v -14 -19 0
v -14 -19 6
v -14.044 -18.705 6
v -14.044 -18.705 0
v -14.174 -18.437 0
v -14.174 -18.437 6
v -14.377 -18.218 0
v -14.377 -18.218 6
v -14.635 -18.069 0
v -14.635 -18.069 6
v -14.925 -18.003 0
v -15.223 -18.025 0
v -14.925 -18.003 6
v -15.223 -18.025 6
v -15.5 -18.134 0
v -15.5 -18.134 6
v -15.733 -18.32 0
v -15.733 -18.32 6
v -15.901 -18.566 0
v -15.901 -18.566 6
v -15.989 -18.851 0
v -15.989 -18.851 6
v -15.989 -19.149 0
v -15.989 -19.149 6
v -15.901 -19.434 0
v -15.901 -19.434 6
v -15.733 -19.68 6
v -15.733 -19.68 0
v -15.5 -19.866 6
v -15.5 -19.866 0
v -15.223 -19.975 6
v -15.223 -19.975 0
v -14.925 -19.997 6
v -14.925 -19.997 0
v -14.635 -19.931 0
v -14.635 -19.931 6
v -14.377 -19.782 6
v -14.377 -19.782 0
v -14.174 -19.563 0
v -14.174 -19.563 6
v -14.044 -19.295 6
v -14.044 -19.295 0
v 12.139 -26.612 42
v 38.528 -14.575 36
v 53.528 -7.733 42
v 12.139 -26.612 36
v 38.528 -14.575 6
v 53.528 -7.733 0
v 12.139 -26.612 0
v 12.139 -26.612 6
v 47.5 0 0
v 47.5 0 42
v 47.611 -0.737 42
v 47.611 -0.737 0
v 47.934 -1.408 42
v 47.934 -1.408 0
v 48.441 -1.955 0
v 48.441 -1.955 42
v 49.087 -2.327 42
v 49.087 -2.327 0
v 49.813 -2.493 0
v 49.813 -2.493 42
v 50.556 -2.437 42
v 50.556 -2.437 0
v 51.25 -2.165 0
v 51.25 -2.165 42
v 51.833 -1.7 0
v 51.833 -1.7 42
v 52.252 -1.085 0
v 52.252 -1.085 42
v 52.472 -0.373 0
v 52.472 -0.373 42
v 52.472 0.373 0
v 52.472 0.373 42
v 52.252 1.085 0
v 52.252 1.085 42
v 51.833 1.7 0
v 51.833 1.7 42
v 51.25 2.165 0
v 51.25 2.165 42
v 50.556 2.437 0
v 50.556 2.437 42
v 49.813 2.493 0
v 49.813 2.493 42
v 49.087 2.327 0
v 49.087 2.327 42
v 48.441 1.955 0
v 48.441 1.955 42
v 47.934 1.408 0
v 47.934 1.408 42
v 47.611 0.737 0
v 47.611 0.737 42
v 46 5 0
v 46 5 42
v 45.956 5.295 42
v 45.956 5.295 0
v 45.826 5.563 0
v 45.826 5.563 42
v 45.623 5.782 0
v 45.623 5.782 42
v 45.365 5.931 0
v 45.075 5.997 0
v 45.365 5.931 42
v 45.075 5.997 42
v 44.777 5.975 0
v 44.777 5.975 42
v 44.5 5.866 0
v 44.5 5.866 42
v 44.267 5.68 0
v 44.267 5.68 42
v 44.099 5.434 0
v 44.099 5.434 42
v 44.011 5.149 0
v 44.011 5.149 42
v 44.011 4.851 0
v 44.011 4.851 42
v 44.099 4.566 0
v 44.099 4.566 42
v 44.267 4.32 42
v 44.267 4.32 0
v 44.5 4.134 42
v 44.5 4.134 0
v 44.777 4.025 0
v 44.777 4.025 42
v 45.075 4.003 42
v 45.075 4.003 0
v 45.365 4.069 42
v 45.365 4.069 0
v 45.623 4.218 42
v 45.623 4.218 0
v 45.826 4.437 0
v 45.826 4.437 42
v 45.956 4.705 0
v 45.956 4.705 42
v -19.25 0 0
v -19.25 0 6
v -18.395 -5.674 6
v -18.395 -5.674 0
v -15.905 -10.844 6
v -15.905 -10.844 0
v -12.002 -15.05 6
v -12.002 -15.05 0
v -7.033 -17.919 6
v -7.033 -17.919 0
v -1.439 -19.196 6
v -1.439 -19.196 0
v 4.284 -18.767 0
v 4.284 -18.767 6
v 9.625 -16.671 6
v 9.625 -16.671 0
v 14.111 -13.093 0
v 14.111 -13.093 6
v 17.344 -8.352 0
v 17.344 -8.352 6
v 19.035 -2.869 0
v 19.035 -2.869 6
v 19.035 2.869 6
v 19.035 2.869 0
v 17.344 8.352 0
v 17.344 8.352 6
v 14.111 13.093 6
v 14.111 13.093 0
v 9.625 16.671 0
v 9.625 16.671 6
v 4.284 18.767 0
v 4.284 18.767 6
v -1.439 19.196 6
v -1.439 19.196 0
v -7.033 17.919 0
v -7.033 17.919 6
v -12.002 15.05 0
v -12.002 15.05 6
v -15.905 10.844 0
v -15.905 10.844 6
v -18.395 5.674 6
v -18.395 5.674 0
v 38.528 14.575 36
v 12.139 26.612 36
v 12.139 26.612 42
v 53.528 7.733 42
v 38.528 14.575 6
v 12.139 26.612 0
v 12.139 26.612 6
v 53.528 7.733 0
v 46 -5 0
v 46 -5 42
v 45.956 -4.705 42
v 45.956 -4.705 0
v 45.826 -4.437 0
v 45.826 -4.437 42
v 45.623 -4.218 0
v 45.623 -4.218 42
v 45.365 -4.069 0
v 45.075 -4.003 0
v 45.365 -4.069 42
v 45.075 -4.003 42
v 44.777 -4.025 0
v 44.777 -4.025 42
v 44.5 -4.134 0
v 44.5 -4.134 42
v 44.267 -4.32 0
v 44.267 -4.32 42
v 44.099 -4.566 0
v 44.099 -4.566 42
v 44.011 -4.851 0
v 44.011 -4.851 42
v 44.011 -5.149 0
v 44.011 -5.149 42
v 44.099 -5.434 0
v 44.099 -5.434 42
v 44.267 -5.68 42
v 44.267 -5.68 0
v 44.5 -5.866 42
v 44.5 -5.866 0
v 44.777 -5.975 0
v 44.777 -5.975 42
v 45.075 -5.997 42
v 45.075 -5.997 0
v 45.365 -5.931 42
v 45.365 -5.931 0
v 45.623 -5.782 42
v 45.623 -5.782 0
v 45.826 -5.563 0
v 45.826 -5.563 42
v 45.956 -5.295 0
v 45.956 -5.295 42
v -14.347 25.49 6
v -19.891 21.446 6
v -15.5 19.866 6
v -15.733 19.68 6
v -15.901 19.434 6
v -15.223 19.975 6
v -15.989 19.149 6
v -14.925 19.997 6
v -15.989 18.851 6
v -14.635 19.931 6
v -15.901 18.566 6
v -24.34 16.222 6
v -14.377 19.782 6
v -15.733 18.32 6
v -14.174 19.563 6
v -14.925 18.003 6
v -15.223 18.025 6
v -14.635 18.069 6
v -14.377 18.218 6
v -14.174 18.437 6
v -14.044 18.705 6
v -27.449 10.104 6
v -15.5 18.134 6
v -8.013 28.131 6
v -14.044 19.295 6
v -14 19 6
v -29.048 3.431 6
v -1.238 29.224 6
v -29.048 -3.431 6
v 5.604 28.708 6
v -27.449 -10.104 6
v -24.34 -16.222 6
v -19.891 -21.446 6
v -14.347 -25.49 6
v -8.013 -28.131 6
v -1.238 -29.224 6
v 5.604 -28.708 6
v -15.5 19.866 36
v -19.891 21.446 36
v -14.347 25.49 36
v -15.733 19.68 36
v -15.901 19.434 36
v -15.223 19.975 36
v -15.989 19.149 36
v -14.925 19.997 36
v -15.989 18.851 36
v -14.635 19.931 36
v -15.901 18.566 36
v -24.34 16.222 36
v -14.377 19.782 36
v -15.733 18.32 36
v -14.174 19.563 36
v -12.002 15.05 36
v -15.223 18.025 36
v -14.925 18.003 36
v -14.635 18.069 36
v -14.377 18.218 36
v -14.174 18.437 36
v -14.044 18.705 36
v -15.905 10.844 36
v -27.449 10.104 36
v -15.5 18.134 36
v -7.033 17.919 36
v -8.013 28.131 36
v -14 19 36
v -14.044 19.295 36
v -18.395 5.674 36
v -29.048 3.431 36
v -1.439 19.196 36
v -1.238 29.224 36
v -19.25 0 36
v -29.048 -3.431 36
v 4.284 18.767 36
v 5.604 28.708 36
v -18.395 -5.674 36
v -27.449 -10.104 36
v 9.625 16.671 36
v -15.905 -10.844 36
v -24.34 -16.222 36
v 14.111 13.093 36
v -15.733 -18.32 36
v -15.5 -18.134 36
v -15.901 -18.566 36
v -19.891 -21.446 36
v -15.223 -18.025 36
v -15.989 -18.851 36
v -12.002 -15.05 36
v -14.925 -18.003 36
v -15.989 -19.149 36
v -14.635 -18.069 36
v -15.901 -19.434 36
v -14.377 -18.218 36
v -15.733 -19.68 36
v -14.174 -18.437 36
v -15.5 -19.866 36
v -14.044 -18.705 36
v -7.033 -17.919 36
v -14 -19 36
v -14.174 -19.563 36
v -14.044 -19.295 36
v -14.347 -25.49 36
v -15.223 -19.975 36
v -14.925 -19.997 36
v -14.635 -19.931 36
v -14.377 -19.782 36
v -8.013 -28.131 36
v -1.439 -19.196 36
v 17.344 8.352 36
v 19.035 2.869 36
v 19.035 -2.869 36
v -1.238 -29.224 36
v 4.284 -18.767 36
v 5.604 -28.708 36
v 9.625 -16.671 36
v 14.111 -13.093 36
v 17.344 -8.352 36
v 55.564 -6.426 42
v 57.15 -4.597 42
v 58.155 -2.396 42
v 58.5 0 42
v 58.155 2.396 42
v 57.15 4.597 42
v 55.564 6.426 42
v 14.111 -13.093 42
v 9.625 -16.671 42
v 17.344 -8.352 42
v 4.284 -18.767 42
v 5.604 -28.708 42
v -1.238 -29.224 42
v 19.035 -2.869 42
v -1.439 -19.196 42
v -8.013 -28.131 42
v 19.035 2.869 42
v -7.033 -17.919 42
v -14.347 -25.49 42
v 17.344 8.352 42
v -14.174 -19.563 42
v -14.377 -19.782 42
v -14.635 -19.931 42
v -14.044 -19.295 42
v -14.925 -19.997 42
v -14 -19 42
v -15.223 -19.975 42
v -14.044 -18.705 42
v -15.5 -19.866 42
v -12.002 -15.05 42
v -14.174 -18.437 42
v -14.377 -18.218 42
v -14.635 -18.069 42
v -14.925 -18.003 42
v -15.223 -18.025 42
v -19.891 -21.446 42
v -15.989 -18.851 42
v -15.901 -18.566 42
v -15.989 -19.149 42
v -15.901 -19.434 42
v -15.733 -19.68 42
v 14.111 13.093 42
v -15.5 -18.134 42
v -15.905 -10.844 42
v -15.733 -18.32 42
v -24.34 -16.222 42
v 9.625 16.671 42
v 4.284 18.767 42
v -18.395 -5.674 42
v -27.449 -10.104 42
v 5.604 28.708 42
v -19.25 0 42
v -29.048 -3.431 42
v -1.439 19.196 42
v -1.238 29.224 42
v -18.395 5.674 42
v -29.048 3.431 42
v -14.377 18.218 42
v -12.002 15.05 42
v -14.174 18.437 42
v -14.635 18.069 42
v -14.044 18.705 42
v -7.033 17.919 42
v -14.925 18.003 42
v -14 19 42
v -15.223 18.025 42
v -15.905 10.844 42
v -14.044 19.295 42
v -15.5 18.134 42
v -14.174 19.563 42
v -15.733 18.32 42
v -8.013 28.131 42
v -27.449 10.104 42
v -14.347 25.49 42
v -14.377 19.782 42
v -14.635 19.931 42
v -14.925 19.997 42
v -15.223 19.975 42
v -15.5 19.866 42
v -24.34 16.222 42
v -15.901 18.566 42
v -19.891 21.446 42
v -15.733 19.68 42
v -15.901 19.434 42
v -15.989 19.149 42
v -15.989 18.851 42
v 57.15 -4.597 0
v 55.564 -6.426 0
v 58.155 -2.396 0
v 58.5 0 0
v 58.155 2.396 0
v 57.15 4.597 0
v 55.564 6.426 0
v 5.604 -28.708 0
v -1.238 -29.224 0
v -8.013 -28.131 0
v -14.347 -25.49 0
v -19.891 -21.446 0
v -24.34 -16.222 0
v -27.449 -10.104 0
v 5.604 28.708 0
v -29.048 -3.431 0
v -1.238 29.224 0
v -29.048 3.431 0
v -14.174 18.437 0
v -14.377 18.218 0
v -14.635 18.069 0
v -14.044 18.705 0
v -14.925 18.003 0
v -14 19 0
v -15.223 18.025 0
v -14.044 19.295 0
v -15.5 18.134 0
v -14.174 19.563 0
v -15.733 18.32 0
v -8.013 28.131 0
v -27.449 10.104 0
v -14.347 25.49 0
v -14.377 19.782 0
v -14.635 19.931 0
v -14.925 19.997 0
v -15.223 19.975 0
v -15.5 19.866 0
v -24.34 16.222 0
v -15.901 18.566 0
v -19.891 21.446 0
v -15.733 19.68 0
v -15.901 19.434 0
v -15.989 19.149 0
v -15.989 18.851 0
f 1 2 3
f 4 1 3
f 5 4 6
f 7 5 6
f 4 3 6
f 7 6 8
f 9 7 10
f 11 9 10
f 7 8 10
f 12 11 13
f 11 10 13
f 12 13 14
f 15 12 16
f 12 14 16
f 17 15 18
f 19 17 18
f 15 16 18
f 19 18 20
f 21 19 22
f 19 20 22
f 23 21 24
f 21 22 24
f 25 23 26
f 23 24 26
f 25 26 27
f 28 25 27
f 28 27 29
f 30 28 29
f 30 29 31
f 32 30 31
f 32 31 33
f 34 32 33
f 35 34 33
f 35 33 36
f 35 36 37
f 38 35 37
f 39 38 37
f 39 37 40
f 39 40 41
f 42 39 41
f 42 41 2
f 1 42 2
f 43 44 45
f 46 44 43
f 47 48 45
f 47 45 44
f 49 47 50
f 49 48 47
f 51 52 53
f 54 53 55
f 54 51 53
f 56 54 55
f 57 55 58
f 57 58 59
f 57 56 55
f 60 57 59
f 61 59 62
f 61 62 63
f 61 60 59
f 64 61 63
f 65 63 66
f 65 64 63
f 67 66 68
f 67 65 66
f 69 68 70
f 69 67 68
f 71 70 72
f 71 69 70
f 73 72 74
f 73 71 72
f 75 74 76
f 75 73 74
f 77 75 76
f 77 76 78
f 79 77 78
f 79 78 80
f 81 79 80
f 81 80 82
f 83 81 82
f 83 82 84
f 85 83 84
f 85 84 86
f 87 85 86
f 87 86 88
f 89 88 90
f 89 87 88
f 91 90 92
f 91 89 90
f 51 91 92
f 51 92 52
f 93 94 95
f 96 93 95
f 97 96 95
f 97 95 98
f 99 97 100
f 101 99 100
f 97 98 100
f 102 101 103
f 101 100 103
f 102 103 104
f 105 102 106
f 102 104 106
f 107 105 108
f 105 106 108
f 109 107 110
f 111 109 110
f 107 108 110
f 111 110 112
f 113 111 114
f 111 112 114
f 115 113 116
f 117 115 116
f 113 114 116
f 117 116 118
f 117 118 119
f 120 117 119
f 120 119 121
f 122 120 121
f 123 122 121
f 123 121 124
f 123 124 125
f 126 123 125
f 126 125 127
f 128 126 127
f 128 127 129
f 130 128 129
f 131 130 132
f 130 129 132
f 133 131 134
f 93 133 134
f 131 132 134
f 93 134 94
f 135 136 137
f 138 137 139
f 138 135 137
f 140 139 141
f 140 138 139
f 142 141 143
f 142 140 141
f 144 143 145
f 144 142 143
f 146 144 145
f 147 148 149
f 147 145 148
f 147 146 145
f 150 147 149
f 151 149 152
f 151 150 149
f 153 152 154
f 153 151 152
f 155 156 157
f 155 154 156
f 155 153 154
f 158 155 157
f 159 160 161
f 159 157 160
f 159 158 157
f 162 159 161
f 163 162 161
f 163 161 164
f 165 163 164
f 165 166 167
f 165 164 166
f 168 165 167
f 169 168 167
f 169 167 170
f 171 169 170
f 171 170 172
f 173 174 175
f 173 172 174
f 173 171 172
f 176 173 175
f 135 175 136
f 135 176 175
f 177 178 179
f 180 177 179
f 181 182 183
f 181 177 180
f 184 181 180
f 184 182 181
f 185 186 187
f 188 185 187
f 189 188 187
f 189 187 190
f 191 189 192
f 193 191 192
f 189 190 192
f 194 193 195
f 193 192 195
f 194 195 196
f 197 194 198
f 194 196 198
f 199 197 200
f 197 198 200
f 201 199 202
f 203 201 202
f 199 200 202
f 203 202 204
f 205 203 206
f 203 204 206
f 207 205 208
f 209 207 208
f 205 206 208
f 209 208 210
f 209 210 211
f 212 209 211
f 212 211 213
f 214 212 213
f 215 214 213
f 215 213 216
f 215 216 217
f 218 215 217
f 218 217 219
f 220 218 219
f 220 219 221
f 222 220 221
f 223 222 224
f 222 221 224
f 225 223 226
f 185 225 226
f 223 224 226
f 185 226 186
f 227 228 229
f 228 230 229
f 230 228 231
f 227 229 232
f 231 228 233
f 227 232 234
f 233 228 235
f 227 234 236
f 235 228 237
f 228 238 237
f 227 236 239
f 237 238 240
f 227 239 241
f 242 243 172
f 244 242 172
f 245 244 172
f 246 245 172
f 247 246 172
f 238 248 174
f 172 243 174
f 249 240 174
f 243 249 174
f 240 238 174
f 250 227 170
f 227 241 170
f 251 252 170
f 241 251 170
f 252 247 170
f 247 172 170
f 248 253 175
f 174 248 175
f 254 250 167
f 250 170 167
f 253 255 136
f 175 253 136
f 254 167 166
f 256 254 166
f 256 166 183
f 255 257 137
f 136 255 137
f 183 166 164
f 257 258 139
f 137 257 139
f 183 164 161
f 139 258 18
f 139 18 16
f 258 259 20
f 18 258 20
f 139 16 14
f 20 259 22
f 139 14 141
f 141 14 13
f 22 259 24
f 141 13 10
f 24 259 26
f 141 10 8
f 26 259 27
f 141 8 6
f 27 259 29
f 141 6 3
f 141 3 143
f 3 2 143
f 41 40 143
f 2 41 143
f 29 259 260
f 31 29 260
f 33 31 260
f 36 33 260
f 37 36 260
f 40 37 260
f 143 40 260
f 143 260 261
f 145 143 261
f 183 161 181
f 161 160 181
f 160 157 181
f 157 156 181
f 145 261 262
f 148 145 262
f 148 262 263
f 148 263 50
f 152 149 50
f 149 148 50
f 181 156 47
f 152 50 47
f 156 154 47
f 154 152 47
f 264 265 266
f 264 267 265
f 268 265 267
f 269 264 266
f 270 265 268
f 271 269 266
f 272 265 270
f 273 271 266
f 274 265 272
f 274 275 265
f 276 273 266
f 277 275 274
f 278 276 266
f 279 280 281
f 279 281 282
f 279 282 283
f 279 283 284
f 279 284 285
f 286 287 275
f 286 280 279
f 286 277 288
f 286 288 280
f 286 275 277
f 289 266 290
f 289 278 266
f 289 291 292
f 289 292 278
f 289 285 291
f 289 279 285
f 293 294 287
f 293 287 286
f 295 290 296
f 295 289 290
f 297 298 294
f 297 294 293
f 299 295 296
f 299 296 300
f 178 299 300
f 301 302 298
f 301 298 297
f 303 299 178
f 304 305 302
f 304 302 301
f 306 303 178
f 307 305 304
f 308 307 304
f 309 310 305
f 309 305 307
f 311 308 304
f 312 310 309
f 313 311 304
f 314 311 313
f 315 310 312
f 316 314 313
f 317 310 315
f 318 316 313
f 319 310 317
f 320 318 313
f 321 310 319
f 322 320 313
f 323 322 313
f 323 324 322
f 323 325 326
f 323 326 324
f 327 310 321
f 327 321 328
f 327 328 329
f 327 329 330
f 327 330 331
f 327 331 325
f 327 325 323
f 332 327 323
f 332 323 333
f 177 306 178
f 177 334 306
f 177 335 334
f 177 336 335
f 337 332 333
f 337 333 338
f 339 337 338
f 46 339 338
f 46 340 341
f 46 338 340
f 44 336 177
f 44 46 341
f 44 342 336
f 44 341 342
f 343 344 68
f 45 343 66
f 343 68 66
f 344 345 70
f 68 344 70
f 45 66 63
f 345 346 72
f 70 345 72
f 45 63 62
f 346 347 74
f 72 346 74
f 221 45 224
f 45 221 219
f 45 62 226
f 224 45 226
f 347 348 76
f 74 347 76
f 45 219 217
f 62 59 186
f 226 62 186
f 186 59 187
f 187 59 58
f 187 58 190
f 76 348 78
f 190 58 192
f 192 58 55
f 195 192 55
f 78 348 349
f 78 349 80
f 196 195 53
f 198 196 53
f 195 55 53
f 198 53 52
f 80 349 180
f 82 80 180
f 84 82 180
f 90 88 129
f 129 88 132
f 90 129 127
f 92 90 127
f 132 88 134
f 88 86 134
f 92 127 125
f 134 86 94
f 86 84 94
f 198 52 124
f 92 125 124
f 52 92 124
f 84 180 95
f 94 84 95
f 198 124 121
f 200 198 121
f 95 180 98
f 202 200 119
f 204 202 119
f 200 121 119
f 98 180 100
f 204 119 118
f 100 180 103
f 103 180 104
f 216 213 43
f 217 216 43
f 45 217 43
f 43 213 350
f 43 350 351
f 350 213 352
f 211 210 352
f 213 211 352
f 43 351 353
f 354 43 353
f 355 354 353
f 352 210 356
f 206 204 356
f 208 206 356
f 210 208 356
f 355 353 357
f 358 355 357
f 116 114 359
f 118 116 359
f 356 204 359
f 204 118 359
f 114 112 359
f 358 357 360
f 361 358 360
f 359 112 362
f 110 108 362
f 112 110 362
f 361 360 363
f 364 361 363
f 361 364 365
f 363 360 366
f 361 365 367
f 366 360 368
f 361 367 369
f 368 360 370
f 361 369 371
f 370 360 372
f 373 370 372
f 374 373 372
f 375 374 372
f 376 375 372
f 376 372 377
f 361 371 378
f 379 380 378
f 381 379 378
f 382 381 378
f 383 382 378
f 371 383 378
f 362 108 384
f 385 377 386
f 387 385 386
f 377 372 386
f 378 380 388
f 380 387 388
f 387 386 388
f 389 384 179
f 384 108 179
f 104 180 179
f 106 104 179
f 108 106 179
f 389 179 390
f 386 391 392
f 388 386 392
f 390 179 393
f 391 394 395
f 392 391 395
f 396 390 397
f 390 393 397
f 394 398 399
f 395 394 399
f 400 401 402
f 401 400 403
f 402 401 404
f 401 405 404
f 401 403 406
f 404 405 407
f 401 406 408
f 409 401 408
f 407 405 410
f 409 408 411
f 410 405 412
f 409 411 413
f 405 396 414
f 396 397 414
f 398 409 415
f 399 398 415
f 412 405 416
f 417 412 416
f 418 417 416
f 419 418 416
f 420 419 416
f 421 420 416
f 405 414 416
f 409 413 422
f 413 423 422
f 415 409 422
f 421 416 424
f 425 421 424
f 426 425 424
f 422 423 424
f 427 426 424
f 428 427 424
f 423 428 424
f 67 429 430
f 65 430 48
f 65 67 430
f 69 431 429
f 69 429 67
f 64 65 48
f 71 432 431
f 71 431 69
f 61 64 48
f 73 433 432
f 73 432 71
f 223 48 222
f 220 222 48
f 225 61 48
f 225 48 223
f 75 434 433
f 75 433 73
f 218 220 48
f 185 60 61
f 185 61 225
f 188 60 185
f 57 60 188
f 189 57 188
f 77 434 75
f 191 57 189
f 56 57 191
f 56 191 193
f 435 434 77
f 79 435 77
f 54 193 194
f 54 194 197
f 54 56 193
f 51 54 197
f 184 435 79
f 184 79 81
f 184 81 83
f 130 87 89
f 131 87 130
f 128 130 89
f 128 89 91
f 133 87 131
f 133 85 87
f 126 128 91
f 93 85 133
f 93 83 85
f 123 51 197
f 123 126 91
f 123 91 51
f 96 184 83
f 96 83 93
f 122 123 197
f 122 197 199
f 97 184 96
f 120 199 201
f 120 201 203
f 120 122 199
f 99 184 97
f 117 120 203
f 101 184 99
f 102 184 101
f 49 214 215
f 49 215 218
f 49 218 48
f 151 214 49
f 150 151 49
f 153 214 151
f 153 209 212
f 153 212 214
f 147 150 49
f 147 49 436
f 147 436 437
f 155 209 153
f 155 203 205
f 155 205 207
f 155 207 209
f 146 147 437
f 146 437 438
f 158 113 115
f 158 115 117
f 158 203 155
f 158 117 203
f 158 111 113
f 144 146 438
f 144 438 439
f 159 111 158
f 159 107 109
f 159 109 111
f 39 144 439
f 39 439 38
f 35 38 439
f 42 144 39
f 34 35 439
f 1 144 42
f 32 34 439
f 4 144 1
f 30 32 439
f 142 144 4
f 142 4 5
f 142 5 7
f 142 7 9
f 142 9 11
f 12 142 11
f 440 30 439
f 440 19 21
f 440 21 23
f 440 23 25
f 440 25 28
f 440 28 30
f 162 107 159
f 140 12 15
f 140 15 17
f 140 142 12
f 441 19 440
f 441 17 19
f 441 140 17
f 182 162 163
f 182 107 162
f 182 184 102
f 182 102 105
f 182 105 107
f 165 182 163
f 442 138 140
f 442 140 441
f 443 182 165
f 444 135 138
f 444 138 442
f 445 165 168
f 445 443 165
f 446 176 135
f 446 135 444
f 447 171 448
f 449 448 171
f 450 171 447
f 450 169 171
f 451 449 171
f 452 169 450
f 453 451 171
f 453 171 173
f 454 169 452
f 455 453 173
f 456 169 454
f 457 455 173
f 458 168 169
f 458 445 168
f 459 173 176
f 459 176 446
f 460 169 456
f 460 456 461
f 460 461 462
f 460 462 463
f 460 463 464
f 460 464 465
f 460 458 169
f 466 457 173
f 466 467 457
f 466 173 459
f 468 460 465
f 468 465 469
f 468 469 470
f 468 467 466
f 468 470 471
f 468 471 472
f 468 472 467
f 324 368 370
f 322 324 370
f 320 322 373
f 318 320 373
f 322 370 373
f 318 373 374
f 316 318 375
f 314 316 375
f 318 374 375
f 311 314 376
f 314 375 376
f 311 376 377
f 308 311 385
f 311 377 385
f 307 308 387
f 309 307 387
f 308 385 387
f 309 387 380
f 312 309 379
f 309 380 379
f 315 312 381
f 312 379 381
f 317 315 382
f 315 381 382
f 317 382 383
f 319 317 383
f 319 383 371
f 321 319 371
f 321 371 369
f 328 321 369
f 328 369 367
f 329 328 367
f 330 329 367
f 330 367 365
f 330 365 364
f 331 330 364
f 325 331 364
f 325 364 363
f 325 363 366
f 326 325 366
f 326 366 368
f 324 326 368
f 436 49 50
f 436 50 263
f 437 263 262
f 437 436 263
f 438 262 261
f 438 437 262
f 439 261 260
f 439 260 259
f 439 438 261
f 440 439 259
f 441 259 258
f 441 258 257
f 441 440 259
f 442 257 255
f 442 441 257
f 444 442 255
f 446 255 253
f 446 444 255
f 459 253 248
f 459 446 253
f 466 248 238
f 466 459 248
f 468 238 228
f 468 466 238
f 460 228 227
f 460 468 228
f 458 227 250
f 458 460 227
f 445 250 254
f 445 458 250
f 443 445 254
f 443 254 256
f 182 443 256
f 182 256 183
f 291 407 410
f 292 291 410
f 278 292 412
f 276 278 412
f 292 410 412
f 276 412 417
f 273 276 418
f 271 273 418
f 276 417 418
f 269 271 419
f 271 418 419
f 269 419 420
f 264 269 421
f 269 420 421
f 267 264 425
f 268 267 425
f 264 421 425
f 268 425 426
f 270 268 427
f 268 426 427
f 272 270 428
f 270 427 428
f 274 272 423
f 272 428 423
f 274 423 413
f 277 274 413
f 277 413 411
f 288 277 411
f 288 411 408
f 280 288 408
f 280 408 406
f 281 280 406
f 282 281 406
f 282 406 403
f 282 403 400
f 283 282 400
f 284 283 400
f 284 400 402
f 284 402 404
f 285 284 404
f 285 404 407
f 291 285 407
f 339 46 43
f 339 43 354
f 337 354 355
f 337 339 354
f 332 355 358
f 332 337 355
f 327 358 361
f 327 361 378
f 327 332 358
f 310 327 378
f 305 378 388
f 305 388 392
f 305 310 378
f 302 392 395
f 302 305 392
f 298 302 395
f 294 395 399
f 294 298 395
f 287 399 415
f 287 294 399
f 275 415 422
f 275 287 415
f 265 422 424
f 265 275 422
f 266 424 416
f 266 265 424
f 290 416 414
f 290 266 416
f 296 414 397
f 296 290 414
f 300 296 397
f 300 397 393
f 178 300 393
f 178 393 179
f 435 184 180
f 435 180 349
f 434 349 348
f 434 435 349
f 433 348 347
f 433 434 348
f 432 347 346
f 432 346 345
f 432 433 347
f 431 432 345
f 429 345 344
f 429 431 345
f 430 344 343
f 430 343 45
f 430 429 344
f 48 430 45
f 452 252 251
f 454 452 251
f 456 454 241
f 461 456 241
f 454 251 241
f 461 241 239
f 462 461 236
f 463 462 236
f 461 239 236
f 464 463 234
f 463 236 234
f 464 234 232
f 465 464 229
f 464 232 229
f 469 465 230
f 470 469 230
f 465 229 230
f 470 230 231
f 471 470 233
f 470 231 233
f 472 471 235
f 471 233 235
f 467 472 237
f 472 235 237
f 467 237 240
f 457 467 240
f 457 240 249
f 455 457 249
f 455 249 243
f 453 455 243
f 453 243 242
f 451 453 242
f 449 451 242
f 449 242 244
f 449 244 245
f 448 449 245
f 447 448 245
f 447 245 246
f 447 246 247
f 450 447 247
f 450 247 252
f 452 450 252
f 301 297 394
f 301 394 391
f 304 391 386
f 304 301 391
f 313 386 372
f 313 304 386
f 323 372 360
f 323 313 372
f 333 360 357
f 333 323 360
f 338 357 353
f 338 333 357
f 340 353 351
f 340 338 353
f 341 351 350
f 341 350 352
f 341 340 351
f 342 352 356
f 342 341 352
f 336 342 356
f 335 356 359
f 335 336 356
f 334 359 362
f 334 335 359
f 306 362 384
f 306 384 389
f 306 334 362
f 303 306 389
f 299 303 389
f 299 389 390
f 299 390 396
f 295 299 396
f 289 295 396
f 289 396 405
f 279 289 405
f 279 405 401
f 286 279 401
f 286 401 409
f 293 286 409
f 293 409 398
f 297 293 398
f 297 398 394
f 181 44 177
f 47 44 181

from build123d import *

# Parameters (mm, degrees)
ESQUISSE1_R                  = 19.25
ESQUISSE1_R_2                = 2.5
BOSS_EXTRU_1_DEPTH           = 42
ENL_V_MAT_EXTRU_1_DEPTH      = 74.881298321
ENL_V_MAT_EXTRU_1_DEPTH_BACK = 74.881298321
ESQUISSE2_W                  = 90
ESQUISSE2_H                  = 30
ESQUISSE3_R                  = 1
ENL_V_MAT_EXTRU_2_DEPTH      = 42


with BuildPart() as part:
    # Esquisse1 → Boss.-Extru.1 (new body)
    with BuildSketch(Plane.XY):
        with BuildLine():
            Line((12.13875, 26.612276273), (53.5275, 7.733481994))
            ThreePointArc((53.5275, 7.733481994), (58.5, 0), (53.5275, -7.733481994))
            Line((53.5275, -7.733481994), (12.13875, -26.612276273))
            ThreePointArc((12.13875, -26.612276273), (-29.25, 0), (12.13875, 26.612276273))
        make_face()
        with Locations(Location((0, 0, 0), (0, 0, 180))):
            Circle(ESQUISSE1_R, mode=Mode.SUBTRACT)
        with Locations(Location((50, 0, 0), (0, 0, 180))):
            Circle(ESQUISSE1_R_2, mode=Mode.SUBTRACT)
    extrude(amount=BOSS_EXTRU_1_DEPTH)

    # Esquisse2 → Enlèv. mat.-Extru.1 (cut, two sides: drawn at the far end of the back side and taken through both)
    with BuildSketch(Plane(origin=(5.218823759, 0, 0), x_dir=(1, 0, 0), z_dir=(0, 1, 0)).offset(-ENL_V_MAT_EXTRU_1_DEPTH_BACK)):
        with Locations((-11.691323759, -21)):
            Rectangle(ESQUISSE2_W, ESQUISSE2_H)
    extrude(amount=ENL_V_MAT_EXTRU_1_DEPTH + ENL_V_MAT_EXTRU_1_DEPTH_BACK, mode=Mode.SUBTRACT)

    # Esquisse3 → Enlèv. mat.-Extru.2 (cut)
    with BuildSketch(Plane.XY.offset(42)):
        with Locations((45, 5)):
            Circle(ESQUISSE3_R)
        with Locations((45, -5)):
            Circle(ESQUISSE3_R)
        with Locations((-15, 19)):
            Circle(ESQUISSE3_R)
        with Locations((-15, -19)):
            Circle(ESQUISSE3_R)
    extrude(amount=-ENL_V_MAT_EXTRU_2_DEPTH, mode=Mode.SUBTRACT)


solid = part.part
